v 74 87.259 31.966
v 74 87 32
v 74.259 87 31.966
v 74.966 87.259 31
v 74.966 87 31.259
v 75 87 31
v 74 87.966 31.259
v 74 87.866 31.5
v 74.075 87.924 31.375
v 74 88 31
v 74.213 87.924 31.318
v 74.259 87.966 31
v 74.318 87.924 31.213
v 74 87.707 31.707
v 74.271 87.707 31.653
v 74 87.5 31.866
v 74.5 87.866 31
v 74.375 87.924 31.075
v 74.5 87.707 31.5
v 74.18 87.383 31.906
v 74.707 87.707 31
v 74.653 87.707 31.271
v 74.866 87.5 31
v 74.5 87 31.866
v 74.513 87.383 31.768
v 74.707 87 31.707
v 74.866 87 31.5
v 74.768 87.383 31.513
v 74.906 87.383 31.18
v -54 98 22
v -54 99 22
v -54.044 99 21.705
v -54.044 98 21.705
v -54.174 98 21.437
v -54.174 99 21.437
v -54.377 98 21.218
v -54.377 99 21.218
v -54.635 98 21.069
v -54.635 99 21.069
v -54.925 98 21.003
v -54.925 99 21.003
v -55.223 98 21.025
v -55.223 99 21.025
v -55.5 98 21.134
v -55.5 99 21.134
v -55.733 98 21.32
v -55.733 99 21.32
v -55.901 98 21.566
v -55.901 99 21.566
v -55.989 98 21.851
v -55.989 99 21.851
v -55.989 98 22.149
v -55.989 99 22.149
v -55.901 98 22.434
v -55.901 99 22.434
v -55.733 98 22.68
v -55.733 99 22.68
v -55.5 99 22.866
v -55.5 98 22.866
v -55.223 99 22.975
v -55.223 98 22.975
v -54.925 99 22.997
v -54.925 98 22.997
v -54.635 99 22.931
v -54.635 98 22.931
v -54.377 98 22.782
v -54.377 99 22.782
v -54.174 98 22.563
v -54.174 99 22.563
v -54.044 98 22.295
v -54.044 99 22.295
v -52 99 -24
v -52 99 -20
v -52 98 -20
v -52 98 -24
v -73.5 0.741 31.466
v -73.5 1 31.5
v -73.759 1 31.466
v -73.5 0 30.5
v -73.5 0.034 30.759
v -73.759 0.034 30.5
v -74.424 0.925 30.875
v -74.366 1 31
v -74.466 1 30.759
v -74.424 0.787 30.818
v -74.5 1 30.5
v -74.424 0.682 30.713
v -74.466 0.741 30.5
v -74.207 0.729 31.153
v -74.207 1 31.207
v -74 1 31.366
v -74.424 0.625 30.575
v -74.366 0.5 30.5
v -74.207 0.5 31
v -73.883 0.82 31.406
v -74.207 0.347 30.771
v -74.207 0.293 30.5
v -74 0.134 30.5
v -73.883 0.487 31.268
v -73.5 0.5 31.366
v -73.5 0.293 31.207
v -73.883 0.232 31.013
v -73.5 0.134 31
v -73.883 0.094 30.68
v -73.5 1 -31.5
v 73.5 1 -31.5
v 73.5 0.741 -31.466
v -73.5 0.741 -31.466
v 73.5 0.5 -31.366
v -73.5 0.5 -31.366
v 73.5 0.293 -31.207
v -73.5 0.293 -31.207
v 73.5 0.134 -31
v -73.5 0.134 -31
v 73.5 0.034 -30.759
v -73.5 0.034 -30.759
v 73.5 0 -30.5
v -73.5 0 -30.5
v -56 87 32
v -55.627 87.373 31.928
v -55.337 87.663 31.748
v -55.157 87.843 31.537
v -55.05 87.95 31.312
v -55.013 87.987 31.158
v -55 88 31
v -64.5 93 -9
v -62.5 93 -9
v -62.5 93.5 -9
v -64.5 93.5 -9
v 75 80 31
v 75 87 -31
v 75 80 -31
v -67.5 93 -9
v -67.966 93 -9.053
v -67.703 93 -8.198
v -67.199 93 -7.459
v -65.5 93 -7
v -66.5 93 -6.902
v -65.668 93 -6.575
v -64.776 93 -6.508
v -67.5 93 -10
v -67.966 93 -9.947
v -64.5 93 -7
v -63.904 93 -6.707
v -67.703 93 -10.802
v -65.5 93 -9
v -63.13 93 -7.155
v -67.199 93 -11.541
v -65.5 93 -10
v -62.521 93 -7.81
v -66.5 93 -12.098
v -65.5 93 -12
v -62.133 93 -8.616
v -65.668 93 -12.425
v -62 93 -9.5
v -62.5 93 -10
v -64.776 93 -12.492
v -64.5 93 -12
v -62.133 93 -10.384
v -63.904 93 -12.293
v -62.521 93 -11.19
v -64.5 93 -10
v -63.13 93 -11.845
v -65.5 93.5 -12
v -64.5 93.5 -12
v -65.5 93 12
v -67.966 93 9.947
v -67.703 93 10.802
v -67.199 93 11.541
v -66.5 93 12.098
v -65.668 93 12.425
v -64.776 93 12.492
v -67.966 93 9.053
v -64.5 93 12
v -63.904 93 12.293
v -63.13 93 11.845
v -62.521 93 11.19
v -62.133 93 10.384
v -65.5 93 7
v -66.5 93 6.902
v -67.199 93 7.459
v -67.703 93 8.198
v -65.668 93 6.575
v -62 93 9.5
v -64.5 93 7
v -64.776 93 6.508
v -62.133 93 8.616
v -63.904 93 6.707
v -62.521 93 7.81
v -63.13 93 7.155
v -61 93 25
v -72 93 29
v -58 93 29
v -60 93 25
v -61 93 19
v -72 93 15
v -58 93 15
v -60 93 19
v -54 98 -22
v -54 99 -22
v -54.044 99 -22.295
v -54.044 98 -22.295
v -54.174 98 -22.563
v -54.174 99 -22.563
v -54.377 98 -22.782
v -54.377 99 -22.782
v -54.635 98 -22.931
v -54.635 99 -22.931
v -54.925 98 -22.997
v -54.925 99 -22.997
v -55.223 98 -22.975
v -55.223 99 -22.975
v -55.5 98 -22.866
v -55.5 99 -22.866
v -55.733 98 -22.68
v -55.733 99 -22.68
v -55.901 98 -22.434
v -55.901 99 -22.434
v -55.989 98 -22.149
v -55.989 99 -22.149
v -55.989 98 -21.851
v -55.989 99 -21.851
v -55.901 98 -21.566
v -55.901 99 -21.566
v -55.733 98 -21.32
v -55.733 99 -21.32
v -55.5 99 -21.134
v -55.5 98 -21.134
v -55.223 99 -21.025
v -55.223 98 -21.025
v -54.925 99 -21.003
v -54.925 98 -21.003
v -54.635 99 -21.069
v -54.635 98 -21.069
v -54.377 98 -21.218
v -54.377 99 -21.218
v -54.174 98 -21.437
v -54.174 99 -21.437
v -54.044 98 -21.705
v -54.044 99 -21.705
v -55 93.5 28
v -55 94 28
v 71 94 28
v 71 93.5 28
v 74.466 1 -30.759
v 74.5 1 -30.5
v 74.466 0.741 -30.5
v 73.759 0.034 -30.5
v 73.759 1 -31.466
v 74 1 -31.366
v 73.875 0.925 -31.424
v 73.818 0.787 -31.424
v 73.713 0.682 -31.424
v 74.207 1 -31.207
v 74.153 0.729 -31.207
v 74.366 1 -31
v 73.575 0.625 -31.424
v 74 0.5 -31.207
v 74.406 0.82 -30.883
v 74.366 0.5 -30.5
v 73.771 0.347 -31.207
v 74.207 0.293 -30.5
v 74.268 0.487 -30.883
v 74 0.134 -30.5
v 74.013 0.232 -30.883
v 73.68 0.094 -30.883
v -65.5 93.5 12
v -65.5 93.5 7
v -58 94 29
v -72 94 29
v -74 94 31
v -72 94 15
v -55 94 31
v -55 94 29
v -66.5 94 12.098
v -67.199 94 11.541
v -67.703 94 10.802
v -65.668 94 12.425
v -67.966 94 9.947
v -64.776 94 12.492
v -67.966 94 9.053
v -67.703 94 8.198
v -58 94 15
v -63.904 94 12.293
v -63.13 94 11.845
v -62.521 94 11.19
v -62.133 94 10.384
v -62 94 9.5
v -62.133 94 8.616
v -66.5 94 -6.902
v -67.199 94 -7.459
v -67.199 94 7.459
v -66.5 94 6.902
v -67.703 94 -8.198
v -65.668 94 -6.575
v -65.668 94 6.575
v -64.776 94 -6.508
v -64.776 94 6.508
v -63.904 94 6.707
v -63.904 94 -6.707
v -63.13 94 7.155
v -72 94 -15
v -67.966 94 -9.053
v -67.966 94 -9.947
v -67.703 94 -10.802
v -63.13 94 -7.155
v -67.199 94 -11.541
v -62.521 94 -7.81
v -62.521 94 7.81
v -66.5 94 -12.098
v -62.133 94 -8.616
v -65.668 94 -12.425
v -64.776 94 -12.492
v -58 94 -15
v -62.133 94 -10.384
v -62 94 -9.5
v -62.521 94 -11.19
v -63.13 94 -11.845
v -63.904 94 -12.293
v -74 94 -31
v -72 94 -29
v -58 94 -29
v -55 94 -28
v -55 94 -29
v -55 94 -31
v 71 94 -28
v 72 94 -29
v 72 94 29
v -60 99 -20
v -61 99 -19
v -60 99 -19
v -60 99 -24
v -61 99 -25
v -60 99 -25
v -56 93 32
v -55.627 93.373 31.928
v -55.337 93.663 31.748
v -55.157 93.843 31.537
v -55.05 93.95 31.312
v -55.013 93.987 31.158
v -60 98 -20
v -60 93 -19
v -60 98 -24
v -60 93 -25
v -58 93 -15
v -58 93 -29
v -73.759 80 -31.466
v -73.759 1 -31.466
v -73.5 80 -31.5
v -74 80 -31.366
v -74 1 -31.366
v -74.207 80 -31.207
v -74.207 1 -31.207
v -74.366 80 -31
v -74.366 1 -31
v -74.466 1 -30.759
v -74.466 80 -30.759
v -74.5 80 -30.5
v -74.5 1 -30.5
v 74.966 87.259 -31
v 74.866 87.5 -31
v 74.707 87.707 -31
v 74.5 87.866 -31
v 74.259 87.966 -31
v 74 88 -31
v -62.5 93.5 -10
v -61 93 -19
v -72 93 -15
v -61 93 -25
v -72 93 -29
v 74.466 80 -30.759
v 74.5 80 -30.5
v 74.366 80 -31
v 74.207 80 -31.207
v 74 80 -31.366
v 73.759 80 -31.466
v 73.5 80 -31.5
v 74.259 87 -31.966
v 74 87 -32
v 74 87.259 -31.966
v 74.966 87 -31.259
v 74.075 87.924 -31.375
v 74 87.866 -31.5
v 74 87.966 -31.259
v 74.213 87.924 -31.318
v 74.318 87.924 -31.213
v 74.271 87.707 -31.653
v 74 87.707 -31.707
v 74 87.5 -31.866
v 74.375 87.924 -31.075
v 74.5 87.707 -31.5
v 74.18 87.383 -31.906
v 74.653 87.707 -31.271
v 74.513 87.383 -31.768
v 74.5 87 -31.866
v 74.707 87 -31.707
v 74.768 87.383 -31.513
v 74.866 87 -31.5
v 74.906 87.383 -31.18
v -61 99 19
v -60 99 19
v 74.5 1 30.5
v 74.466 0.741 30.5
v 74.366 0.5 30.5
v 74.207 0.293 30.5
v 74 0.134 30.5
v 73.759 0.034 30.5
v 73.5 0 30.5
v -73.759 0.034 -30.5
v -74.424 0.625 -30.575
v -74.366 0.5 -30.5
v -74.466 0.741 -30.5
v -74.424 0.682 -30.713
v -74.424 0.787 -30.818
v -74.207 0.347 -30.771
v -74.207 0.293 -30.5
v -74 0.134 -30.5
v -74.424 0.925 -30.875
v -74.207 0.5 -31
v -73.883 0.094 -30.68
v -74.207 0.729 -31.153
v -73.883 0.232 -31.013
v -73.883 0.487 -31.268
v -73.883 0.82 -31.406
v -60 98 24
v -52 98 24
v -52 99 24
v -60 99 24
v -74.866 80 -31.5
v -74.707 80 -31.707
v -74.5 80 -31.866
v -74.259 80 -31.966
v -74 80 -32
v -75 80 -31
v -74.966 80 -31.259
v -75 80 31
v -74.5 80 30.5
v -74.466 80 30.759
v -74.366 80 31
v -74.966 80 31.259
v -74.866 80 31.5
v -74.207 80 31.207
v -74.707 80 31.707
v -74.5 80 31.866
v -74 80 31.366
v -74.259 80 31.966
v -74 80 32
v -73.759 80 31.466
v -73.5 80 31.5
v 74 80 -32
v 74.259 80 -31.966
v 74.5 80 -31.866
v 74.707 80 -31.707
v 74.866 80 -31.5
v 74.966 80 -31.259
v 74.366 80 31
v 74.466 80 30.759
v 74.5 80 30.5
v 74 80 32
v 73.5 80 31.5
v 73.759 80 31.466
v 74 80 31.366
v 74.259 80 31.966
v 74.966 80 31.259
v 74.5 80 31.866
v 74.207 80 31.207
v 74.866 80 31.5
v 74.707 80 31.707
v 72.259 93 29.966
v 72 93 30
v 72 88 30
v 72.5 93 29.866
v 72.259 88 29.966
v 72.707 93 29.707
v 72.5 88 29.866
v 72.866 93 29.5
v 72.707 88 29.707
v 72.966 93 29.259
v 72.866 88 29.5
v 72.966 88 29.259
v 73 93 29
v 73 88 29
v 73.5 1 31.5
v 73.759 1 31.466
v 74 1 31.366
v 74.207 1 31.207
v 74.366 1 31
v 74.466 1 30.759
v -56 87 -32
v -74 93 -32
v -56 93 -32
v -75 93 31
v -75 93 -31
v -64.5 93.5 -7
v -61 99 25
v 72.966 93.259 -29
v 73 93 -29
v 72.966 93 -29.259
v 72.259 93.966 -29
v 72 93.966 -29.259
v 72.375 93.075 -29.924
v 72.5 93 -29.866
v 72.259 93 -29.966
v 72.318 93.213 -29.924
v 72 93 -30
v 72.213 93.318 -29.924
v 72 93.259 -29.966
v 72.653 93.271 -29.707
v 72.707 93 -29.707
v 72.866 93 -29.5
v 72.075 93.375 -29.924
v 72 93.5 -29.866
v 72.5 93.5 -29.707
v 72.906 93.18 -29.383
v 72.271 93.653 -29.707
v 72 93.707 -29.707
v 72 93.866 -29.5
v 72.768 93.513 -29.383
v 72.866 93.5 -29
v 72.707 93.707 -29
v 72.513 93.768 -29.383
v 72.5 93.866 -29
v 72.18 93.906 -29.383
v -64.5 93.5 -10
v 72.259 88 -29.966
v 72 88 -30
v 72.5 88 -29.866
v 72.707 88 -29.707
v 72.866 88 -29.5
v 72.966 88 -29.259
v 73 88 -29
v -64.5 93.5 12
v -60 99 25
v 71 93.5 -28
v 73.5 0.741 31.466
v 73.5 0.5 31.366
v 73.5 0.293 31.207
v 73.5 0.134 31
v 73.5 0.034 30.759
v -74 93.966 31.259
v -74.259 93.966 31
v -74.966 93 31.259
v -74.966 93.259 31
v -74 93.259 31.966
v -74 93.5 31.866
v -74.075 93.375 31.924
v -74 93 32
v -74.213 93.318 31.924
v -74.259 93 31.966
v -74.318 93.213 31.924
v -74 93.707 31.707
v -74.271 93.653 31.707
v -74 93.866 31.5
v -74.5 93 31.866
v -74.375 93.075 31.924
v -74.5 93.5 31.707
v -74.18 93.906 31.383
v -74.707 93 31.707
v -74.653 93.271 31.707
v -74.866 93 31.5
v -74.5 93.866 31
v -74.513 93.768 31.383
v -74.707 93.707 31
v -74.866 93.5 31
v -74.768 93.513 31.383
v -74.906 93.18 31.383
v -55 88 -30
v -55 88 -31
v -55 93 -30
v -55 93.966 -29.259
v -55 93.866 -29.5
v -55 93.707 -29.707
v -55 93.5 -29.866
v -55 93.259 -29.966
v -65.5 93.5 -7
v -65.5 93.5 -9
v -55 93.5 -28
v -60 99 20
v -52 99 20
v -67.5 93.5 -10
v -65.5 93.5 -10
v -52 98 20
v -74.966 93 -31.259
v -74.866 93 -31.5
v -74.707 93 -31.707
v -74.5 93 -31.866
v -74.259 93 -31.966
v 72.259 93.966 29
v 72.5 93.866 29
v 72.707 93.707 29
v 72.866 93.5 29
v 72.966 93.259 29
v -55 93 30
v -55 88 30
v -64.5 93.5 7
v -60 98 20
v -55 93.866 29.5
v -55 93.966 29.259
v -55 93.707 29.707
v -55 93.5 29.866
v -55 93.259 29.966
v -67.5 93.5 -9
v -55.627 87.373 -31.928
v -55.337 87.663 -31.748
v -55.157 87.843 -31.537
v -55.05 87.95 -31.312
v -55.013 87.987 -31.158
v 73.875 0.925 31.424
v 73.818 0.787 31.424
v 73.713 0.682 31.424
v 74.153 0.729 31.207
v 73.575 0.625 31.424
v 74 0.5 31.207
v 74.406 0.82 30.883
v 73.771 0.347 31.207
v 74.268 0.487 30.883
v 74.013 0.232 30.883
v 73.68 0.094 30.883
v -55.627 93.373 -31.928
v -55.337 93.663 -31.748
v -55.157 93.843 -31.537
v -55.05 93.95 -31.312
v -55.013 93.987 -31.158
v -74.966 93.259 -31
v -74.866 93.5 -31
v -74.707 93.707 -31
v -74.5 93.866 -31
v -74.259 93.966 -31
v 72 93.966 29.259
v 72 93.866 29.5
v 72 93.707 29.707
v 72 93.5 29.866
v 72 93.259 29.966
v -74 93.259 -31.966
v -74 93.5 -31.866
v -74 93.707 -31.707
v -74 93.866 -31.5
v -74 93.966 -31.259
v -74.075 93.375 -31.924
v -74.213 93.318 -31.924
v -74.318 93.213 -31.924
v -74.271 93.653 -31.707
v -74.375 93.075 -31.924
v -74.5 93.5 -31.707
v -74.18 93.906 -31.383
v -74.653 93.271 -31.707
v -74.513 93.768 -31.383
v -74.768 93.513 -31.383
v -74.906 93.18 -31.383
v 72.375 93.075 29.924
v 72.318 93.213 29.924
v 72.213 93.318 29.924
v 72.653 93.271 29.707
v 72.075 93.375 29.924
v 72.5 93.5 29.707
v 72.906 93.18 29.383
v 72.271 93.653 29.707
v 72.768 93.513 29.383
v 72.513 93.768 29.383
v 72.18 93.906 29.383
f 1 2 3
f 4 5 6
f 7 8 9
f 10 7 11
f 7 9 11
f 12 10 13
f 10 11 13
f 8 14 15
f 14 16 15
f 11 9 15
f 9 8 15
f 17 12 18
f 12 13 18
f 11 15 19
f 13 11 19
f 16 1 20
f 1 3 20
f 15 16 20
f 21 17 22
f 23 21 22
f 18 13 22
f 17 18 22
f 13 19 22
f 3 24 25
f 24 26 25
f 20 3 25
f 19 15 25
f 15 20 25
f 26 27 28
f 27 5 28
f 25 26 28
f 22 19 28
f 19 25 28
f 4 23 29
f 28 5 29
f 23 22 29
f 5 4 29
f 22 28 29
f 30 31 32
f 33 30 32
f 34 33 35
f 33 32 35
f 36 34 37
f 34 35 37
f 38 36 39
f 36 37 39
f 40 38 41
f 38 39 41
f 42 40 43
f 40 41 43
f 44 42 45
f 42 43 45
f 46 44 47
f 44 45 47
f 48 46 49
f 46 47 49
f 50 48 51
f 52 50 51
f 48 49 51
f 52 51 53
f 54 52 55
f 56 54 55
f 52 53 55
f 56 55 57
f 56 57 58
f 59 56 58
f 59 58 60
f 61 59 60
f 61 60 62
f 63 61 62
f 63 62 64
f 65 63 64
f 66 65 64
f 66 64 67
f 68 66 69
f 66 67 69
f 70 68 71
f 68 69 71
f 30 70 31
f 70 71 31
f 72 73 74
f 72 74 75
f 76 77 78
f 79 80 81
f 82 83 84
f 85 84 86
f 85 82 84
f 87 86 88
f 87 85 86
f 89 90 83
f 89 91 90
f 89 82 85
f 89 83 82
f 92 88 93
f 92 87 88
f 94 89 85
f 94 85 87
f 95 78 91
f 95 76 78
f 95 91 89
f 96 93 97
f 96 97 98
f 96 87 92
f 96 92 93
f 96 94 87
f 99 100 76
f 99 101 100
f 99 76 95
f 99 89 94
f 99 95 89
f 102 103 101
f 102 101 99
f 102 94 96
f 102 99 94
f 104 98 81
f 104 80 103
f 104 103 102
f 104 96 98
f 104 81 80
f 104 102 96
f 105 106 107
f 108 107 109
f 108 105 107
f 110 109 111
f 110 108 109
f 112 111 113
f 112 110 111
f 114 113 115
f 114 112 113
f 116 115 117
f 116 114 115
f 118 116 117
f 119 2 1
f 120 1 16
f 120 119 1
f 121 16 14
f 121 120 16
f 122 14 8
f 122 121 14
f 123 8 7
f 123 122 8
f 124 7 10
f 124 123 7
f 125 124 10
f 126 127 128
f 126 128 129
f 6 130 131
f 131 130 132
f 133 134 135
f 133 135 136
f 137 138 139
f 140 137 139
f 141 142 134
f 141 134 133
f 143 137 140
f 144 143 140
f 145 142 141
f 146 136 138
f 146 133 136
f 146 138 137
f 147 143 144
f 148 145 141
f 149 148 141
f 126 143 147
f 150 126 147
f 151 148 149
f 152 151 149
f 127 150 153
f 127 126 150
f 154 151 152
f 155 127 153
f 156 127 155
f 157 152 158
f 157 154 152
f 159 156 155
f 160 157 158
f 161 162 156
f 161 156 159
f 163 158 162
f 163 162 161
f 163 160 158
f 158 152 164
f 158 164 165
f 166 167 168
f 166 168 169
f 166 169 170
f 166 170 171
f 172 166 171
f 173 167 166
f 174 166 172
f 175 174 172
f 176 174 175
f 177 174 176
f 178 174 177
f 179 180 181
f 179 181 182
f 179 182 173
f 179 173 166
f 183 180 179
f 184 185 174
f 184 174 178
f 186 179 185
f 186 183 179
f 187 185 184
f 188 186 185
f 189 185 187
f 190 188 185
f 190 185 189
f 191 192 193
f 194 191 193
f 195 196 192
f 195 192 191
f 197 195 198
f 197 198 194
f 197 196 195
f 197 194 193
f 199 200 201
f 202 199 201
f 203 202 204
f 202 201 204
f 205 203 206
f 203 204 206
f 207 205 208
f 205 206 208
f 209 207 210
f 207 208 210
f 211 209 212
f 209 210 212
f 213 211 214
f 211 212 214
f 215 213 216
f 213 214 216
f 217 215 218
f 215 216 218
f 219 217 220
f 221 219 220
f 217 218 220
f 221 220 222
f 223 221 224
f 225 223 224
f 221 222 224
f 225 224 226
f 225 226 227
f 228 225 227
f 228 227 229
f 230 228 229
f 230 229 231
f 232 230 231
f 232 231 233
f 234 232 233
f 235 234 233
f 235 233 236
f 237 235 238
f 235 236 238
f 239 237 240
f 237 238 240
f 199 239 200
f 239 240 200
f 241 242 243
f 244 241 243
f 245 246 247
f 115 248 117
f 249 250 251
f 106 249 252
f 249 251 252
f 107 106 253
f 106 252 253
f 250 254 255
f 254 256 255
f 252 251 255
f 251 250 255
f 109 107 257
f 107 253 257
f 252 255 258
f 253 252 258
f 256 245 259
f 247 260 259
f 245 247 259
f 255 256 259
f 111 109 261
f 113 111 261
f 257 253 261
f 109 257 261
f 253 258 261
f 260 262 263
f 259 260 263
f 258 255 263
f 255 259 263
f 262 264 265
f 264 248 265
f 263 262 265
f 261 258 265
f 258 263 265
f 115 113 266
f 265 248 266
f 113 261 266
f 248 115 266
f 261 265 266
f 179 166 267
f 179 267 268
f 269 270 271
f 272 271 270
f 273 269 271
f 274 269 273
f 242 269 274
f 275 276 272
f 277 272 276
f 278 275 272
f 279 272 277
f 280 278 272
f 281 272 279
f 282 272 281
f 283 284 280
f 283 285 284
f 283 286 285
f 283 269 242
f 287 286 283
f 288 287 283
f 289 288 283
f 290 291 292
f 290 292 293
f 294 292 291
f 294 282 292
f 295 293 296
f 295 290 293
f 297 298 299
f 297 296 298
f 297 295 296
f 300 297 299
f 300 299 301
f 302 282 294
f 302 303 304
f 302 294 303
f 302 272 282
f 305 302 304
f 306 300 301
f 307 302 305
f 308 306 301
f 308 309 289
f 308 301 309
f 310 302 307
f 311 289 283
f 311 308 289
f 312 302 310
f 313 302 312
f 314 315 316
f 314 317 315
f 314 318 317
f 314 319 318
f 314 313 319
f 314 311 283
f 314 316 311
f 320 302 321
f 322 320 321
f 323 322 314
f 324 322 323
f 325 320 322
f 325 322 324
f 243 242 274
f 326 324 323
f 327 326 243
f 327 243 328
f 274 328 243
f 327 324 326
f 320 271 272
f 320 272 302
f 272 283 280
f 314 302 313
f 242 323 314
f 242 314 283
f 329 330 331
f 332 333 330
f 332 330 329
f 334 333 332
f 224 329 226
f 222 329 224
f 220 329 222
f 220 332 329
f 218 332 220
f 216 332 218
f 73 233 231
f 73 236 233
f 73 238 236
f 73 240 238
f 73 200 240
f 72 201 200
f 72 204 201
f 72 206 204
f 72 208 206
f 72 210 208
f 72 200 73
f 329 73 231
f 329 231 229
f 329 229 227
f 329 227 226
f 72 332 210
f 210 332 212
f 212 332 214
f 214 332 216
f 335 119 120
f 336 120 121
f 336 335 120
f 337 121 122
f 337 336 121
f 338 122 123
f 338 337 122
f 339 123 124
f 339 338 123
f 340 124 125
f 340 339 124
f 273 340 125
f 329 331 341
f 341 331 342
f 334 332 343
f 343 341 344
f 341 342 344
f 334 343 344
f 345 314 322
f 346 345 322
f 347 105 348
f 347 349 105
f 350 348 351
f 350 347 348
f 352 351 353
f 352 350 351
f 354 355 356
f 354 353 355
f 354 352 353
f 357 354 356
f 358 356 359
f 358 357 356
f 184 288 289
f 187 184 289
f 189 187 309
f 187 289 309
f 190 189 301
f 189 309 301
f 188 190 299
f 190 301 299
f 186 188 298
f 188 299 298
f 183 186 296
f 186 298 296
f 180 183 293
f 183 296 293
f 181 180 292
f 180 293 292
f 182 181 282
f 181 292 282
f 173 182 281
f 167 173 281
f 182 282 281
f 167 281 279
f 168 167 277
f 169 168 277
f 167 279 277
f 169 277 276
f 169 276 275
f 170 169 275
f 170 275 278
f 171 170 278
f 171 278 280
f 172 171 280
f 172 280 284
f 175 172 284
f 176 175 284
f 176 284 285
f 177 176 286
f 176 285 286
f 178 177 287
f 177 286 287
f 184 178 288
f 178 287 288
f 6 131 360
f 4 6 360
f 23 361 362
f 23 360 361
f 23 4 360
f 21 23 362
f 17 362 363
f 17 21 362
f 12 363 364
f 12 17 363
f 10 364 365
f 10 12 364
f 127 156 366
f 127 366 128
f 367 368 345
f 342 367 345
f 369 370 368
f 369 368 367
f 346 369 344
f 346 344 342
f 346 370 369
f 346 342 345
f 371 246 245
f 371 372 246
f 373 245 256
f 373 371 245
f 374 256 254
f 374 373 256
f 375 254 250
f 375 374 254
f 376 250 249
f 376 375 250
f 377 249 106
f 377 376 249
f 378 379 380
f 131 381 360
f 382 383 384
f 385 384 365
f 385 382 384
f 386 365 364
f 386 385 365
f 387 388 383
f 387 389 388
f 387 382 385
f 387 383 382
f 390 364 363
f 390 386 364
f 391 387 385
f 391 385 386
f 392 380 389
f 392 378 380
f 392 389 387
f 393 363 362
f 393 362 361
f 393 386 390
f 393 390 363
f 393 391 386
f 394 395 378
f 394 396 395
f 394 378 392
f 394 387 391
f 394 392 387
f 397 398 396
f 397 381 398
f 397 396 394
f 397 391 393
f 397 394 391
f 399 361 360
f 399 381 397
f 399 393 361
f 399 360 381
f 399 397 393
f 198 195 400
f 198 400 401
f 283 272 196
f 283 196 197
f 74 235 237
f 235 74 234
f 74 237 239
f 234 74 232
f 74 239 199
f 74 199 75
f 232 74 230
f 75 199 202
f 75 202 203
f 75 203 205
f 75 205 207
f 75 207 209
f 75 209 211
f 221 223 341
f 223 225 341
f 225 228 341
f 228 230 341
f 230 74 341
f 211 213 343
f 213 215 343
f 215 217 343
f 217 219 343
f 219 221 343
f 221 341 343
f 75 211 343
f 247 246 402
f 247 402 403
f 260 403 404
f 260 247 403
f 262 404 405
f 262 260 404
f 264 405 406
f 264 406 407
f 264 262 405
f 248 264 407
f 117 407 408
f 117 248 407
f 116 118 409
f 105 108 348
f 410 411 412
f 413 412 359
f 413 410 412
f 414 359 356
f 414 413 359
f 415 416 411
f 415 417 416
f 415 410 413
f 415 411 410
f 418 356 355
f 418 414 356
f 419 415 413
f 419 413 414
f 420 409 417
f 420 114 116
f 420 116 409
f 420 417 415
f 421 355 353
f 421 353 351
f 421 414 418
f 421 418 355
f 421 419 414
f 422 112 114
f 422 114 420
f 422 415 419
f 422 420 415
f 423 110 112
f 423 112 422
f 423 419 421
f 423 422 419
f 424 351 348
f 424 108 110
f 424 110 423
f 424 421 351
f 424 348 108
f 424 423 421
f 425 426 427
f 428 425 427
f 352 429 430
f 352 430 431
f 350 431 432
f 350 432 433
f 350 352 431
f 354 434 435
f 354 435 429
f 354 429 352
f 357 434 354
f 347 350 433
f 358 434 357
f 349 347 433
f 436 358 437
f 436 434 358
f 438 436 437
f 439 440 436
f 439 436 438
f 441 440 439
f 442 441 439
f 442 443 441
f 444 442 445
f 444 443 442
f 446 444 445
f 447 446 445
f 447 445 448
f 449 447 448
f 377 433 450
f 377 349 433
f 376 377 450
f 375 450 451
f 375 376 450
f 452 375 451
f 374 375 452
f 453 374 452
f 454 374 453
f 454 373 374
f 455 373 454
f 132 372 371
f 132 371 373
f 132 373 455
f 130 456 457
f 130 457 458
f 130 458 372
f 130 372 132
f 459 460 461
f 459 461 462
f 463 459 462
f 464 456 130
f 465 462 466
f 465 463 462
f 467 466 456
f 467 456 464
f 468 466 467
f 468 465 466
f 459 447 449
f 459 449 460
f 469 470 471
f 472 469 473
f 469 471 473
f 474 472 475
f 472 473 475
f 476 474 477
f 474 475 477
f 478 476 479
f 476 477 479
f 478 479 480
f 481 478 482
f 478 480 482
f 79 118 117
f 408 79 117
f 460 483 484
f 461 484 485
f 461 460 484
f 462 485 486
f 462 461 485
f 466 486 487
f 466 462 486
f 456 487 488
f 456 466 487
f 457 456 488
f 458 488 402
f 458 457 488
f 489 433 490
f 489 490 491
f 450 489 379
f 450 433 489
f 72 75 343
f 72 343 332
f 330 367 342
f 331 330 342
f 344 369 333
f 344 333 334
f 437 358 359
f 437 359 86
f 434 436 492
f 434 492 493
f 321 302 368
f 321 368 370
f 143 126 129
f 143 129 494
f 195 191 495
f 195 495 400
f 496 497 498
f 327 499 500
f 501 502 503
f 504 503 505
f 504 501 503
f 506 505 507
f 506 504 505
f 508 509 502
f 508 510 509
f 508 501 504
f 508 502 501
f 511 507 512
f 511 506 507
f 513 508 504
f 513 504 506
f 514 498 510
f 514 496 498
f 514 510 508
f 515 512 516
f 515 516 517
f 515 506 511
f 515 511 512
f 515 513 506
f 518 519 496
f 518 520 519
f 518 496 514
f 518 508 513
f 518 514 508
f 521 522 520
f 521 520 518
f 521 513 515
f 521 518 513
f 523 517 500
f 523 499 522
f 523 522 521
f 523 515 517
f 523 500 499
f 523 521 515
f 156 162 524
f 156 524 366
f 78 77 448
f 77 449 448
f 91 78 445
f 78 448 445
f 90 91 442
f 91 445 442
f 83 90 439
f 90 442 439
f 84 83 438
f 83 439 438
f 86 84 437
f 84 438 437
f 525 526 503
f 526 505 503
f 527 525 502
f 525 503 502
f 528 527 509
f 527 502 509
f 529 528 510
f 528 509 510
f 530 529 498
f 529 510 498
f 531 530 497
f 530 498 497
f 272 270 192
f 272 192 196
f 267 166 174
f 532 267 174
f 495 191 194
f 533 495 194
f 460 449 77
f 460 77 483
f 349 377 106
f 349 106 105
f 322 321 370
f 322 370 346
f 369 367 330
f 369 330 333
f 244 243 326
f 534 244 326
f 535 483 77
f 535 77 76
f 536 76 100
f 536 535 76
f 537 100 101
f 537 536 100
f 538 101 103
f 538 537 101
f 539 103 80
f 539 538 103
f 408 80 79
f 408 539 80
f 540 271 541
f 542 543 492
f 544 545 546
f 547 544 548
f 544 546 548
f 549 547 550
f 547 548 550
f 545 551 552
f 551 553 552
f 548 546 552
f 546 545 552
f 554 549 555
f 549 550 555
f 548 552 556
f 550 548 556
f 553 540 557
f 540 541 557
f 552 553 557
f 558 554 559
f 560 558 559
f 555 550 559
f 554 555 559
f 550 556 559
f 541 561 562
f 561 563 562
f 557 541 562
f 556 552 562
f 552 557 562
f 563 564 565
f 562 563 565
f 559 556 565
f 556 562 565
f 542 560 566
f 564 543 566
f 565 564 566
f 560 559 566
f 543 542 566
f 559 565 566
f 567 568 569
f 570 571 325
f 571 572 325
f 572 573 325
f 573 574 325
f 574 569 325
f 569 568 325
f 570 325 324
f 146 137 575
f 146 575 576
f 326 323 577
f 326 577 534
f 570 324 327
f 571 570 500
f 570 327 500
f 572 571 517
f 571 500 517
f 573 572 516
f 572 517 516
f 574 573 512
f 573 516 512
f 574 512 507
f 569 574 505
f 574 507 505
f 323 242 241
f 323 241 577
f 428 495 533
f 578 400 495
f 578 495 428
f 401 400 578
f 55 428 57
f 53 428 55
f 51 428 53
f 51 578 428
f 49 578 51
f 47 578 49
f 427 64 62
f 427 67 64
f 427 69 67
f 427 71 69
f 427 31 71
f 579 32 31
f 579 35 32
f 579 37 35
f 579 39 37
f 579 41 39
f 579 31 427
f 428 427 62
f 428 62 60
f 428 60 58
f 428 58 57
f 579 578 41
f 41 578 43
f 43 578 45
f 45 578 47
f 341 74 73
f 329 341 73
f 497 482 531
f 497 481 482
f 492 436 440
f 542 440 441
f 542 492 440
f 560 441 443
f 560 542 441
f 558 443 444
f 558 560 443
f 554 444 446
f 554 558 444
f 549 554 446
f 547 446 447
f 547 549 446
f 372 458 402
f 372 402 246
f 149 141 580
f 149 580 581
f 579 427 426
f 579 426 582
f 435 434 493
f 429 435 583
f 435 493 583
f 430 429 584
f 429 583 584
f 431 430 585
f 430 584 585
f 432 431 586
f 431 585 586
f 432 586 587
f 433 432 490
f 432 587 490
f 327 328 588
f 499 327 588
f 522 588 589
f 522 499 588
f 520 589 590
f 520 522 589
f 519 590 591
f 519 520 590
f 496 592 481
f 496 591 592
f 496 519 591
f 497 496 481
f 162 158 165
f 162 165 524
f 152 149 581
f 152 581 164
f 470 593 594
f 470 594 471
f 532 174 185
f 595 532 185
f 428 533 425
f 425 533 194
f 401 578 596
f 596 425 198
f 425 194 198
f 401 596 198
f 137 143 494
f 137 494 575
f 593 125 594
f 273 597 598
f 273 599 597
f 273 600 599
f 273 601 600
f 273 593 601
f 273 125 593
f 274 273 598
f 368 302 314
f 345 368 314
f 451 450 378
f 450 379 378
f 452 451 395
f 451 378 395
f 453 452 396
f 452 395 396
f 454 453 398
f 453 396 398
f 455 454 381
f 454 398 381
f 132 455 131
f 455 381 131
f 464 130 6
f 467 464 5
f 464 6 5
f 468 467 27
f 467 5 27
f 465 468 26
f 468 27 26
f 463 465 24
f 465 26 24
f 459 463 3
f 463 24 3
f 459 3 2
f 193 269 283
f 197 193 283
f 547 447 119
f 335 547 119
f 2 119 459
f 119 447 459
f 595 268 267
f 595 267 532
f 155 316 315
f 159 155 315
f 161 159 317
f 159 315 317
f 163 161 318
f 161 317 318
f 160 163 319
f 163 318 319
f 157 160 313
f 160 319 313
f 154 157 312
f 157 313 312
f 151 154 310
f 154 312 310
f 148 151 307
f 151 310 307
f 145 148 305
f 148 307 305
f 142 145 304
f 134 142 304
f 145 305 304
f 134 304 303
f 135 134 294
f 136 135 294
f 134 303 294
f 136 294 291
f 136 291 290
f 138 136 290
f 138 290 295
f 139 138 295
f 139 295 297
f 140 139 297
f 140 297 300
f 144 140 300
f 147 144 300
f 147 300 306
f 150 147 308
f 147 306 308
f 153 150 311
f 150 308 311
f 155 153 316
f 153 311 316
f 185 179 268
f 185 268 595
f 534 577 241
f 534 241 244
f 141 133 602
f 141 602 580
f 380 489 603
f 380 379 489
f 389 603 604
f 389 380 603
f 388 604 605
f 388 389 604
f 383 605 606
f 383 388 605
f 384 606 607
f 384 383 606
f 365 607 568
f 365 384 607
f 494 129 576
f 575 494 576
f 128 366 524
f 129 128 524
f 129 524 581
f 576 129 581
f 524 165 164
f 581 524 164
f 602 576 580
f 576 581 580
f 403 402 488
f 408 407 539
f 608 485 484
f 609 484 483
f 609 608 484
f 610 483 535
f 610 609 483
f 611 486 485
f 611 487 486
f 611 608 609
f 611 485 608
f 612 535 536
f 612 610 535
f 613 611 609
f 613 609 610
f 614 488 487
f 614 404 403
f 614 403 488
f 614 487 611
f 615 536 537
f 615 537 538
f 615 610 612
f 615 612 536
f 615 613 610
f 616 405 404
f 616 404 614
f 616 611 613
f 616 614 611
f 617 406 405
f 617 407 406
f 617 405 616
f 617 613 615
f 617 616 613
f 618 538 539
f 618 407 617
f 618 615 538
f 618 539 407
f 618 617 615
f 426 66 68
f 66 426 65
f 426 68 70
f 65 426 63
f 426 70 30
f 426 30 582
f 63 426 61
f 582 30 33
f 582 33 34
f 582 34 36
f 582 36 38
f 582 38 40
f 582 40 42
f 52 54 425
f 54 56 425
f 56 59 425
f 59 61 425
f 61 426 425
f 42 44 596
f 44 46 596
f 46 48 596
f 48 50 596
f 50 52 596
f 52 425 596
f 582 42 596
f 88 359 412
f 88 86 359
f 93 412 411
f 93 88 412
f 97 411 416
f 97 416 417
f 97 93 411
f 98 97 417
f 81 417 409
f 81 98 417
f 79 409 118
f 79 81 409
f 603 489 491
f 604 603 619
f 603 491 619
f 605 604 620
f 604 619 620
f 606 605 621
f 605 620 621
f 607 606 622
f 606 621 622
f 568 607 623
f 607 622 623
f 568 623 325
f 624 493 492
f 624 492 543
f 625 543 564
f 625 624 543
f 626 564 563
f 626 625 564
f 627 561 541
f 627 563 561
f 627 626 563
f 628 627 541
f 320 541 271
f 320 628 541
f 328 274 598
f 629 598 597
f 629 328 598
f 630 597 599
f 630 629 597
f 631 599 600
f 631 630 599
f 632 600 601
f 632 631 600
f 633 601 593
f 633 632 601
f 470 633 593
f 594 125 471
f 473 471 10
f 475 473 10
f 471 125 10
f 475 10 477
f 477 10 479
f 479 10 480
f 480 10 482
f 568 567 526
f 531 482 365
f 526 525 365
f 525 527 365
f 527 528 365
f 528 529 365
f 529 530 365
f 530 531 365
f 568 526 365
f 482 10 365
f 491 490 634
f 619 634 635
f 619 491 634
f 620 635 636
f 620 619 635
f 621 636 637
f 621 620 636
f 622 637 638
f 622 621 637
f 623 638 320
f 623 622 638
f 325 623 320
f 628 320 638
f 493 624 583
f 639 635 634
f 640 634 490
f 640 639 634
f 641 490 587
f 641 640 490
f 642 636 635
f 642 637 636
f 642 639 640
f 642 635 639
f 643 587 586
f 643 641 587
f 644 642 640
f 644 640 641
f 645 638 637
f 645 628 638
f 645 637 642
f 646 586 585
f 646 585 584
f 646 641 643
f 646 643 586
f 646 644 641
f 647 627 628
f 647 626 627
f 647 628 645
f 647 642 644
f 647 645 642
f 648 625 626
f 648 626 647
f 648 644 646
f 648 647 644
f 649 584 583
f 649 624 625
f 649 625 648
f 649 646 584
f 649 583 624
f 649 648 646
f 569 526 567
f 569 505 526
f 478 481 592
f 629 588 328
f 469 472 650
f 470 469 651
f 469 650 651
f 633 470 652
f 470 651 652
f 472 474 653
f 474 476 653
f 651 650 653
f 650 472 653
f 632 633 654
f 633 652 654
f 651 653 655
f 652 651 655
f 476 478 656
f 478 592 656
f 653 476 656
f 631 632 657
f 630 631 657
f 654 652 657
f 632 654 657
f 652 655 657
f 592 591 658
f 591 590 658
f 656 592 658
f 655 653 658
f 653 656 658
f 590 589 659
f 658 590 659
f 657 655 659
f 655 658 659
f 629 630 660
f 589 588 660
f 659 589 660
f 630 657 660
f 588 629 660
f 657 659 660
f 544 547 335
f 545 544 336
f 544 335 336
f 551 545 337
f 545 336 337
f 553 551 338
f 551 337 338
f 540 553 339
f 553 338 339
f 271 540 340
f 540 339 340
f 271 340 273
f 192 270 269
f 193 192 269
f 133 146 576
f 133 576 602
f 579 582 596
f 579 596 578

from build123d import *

# Parameters (mm, degrees)
SKETCH1_W           = 150
SKETCH1_H           = 64
BOSS_EXTRUDE1_DEPTH = 94
SKETCH2_W           = 64
SKETCH2_H           = 6
CUT_EXTRUDE1_DEPTH  = 2
CUT_EXTRUDE2_DEPTH  = 2
SKETCH4_W           = 130
SKETCH4_H           = 6
CUT_EXTRUDE3_DEPTH  = 2
SKETCH5_W           = 126
SKETCH5_H           = 56
CUT_EXTRUDE4_DEPTH  = 0.5
SKETCH6_W           = 14
SKETCH6_H           = 14
CUT_EXTRUDE5_DEPTH  = 1
SKETCH7_W           = 1
SKETCH7_H           = 6
BOSS_EXTRUDE2_DEPTH = 6
SKETCH8_W           = 4
SKETCH8_H           = 1
BOSS_EXTRUDE3_DEPTH = 8
SKETCH9_R           = 1
CUT_EXTRUDE6_DEPTH  = 1
SKETCH13_W          = 64
SKETCH13_H          = 80
CUT_EXTRUDE7_DEPTH  = 0.5
SKETCH14_W          = 149.5
SKETCH14_H          = 80
CUT_EXTRUDE8_DEPTH  = 0.5
SKETCH15_W          = 149.5
SKETCH15_H          = 80
CUT_EXTRUDE9_DEPTH  = 0.5
SKETCH16_W          = 63
SKETCH16_H          = 80
CUT_EXTRUDE10_DEPTH = 0.5
SKETCH17_R          = 3
CUT_EXTRUDE11_DEPTH = 1
SKETCH18_W          = 1
SKETCH18_H          = 5
BOSS_EXTRUDE4_DEPTH = 0.5
FILLET4_R           = 1
FILLET5_R           = 1


with BuildPart() as part:
    # Sketch1 → Boss-Extrude1 (new body)
    with BuildSketch(Plane(origin=(0, 0, 0), x_dir=(1, 0, 0), z_dir=(0, 1, 0))):
        Rectangle(SKETCH1_W, SKETCH1_H)
    extrude(amount=BOSS_EXTRUDE1_DEPTH)

    # Sketch2 → Cut-Extrude1 (cut)
    with BuildSketch(Plane(origin=(75, 0, 0), x_dir=(0, 0, -1), z_dir=(1, 0, 0))):
        with Locations((0, 91)):
            Rectangle(SKETCH2_W, SKETCH2_H)
    extrude(amount=-CUT_EXTRUDE1_DEPTH, mode=Mode.SUBTRACT)

    # Sketch3 → Cut-Extrude2 (cut)
    with BuildSketch(Plane(origin=(0, 0, -32), x_dir=(-1, 0, 0), z_dir=(0, 0, -1))):
        Polygon((-73, 88), (55, 88), (55, 94), (-73, 94), (-75, 94), (-75, 88), align=None)
    extrude(amount=-CUT_EXTRUDE2_DEPTH, mode=Mode.SUBTRACT)

    # Sketch4 → Cut-Extrude3 (cut)
    with BuildSketch(Plane.XY.offset(32)):
        with Locations((10, 91)):
            Rectangle(SKETCH4_W, SKETCH4_H)
    extrude(amount=-CUT_EXTRUDE3_DEPTH, mode=Mode.SUBTRACT)

    # Sketch5 → Cut-Extrude4 (cut)
    with BuildSketch(Plane(origin=(0, 94, 0), x_dir=(1, 0, 0), z_dir=(0, 1, 0))):
        with Locations((8, 0)):
            Rectangle(SKETCH5_W, SKETCH5_H)
    extrude(amount=-CUT_EXTRUDE4_DEPTH, mode=Mode.SUBTRACT)

    # Sketch6 → Cut-Extrude5 (cut)
    with BuildSketch(Plane(origin=(0, 94, 0), x_dir=(1, 0, 0), z_dir=(0, 1, 0))):
        with Locations((-65, -22)):
            Rectangle(SKETCH6_W, SKETCH6_H)
        with Locations((-65, 22)):
            Rectangle(SKETCH6_W, SKETCH6_H)
    extrude(amount=-CUT_EXTRUDE5_DEPTH, mode=Mode.SUBTRACT)

    # Sketch7 → Boss-Extrude2 (add)
    with BuildSketch(Plane(origin=(0, 93, 0), x_dir=(1, 0, 0), z_dir=(0, 1, 0))):
        with Locations((-60.5, 22)):
            Rectangle(SKETCH7_W, SKETCH7_H)
        with Locations((-60.5, -22)):
            Rectangle(SKETCH7_W, SKETCH7_H)
    extrude(amount=BOSS_EXTRUDE2_DEPTH)

    # Sketch8 → Boss-Extrude3 (add)
    with BuildSketch(Plane(origin=(-60, 0, 0), x_dir=(0, 0, -1), z_dir=(1, 0, 0))):
        with Locations((-22, 98.5)):
            Rectangle(SKETCH8_W, SKETCH8_H)
        with Locations((22, 98.5)):
            Rectangle(SKETCH8_W, SKETCH8_H)
    extrude(amount=BOSS_EXTRUDE3_DEPTH)

    # Sketch9 → Cut-Extrude6 (cut)
    with BuildSketch(Plane(origin=(0, 99, 0), x_dir=(1, 0, 0), z_dir=(0, 1, 0))):
        with Locations((-55, 22)):
            Circle(SKETCH9_R)
        with Locations((-55, -22)):
            Circle(SKETCH9_R)
    extrude(amount=-CUT_EXTRUDE6_DEPTH, mode=Mode.SUBTRACT)

    # Sketch13 → Cut-Extrude7 (cut)
    with BuildSketch(Plane(origin=(75, 0, 0), x_dir=(0, 0, -1), z_dir=(1, 0, 0))):
        with Locations((0, 40)):
            Rectangle(SKETCH13_W, SKETCH13_H)
    extrude(amount=-CUT_EXTRUDE7_DEPTH, mode=Mode.SUBTRACT)

    # Sketch14 → Cut-Extrude8 (cut)
    with BuildSketch(Plane.XY.offset(32)):
        with Locations((-0.25, 40)):
            Rectangle(SKETCH14_W, SKETCH14_H)
    extrude(amount=-CUT_EXTRUDE8_DEPTH, mode=Mode.SUBTRACT)

    # Sketch15 → Cut-Extrude9 (cut)
    with BuildSketch(Plane(origin=(0, 0, -32), x_dir=(-1, 0, 0), z_dir=(0, 0, -1))):
        with Locations((0.25, 40)):
            Rectangle(SKETCH15_W, SKETCH15_H)
    extrude(amount=-CUT_EXTRUDE9_DEPTH, mode=Mode.SUBTRACT)

    # Sketch16 → Cut-Extrude10 (cut)
    with BuildSketch(Plane.ZY.offset(75)):
        with Locations((0, 40)):
            Rectangle(SKETCH16_W, SKETCH16_H)
    extrude(amount=-CUT_EXTRUDE10_DEPTH, mode=Mode.SUBTRACT)

    # Sketch17 → Cut-Extrude11 (cut)
    with BuildSketch(Plane(origin=(0, 94, 0), x_dir=(1, 0, 0), z_dir=(0, 1, 0))):
        with Locations((-65, 9.5)):
            Circle(SKETCH17_R)
        with Locations((-65, -9.5)):
            Circle(SKETCH17_R)
    extrude(amount=-CUT_EXTRUDE11_DEPTH, mode=Mode.SUBTRACT)

    # Sketch18 → Boss-Extrude4 (add)
    with BuildSketch(Plane(origin=(0, 93, 0), x_dir=(1, 0, 0), z_dir=(0, 1, 0))):
        Polygon((-65.5, 12), (-64.5, 12), (-64.5, 10), (-62.5, 10), (-62.5, 9), (-64.5, 9), (-64.5, 7), (-65.5, 7), (-65.5, 9), (-67.5, 9), (-67.5, 10), (-65.5, 10), align=None)
        with Locations((-65, -9.5)):
            Rectangle(SKETCH18_W, SKETCH18_H)
    extrude(amount=BOSS_EXTRUDE4_DEPTH)

    # Fillet4
    fillet4_edges = [part.edges().sort_by_distance(p)[0] for p in [
        (74.5, 0, 0),
        (74.5, 40, 31.5),
        (74.5, 40, -31.5),
        (0, 0, -31.5),
        (0, 0, 31.5),
        (-74.5, 40, 31.5),
        (-74.5, 0, 0),
        (-74.5, 40, -31.5),
    ]]
    fillet(fillet4_edges, radius=FILLET4_R)

    # Fillet5
    fillet5_edges = [part.edges().sort_by_distance(p)[0] for p in [
        (-75, 94, 0),
        (-65, 94, 32),
        (75, 84, 32),
        (75, 84, -32),
        (10, 88, -32),
        (10, 88, 32),
        (75, 88, 0),
        (73, 94, 0),
        (73, 91, -30),
        (-65, 94, -32),
        (9, 94, -30),
        (-55, 91, -32),
        (73, 91, 30),
        (9, 94, 30),
        (-55, 91, 32),
        (-75, 87, 32),
        (-75, 87, -32),
    ]]
    fillet(fillet5_edges, radius=FILLET5_R)


solid = part.part
